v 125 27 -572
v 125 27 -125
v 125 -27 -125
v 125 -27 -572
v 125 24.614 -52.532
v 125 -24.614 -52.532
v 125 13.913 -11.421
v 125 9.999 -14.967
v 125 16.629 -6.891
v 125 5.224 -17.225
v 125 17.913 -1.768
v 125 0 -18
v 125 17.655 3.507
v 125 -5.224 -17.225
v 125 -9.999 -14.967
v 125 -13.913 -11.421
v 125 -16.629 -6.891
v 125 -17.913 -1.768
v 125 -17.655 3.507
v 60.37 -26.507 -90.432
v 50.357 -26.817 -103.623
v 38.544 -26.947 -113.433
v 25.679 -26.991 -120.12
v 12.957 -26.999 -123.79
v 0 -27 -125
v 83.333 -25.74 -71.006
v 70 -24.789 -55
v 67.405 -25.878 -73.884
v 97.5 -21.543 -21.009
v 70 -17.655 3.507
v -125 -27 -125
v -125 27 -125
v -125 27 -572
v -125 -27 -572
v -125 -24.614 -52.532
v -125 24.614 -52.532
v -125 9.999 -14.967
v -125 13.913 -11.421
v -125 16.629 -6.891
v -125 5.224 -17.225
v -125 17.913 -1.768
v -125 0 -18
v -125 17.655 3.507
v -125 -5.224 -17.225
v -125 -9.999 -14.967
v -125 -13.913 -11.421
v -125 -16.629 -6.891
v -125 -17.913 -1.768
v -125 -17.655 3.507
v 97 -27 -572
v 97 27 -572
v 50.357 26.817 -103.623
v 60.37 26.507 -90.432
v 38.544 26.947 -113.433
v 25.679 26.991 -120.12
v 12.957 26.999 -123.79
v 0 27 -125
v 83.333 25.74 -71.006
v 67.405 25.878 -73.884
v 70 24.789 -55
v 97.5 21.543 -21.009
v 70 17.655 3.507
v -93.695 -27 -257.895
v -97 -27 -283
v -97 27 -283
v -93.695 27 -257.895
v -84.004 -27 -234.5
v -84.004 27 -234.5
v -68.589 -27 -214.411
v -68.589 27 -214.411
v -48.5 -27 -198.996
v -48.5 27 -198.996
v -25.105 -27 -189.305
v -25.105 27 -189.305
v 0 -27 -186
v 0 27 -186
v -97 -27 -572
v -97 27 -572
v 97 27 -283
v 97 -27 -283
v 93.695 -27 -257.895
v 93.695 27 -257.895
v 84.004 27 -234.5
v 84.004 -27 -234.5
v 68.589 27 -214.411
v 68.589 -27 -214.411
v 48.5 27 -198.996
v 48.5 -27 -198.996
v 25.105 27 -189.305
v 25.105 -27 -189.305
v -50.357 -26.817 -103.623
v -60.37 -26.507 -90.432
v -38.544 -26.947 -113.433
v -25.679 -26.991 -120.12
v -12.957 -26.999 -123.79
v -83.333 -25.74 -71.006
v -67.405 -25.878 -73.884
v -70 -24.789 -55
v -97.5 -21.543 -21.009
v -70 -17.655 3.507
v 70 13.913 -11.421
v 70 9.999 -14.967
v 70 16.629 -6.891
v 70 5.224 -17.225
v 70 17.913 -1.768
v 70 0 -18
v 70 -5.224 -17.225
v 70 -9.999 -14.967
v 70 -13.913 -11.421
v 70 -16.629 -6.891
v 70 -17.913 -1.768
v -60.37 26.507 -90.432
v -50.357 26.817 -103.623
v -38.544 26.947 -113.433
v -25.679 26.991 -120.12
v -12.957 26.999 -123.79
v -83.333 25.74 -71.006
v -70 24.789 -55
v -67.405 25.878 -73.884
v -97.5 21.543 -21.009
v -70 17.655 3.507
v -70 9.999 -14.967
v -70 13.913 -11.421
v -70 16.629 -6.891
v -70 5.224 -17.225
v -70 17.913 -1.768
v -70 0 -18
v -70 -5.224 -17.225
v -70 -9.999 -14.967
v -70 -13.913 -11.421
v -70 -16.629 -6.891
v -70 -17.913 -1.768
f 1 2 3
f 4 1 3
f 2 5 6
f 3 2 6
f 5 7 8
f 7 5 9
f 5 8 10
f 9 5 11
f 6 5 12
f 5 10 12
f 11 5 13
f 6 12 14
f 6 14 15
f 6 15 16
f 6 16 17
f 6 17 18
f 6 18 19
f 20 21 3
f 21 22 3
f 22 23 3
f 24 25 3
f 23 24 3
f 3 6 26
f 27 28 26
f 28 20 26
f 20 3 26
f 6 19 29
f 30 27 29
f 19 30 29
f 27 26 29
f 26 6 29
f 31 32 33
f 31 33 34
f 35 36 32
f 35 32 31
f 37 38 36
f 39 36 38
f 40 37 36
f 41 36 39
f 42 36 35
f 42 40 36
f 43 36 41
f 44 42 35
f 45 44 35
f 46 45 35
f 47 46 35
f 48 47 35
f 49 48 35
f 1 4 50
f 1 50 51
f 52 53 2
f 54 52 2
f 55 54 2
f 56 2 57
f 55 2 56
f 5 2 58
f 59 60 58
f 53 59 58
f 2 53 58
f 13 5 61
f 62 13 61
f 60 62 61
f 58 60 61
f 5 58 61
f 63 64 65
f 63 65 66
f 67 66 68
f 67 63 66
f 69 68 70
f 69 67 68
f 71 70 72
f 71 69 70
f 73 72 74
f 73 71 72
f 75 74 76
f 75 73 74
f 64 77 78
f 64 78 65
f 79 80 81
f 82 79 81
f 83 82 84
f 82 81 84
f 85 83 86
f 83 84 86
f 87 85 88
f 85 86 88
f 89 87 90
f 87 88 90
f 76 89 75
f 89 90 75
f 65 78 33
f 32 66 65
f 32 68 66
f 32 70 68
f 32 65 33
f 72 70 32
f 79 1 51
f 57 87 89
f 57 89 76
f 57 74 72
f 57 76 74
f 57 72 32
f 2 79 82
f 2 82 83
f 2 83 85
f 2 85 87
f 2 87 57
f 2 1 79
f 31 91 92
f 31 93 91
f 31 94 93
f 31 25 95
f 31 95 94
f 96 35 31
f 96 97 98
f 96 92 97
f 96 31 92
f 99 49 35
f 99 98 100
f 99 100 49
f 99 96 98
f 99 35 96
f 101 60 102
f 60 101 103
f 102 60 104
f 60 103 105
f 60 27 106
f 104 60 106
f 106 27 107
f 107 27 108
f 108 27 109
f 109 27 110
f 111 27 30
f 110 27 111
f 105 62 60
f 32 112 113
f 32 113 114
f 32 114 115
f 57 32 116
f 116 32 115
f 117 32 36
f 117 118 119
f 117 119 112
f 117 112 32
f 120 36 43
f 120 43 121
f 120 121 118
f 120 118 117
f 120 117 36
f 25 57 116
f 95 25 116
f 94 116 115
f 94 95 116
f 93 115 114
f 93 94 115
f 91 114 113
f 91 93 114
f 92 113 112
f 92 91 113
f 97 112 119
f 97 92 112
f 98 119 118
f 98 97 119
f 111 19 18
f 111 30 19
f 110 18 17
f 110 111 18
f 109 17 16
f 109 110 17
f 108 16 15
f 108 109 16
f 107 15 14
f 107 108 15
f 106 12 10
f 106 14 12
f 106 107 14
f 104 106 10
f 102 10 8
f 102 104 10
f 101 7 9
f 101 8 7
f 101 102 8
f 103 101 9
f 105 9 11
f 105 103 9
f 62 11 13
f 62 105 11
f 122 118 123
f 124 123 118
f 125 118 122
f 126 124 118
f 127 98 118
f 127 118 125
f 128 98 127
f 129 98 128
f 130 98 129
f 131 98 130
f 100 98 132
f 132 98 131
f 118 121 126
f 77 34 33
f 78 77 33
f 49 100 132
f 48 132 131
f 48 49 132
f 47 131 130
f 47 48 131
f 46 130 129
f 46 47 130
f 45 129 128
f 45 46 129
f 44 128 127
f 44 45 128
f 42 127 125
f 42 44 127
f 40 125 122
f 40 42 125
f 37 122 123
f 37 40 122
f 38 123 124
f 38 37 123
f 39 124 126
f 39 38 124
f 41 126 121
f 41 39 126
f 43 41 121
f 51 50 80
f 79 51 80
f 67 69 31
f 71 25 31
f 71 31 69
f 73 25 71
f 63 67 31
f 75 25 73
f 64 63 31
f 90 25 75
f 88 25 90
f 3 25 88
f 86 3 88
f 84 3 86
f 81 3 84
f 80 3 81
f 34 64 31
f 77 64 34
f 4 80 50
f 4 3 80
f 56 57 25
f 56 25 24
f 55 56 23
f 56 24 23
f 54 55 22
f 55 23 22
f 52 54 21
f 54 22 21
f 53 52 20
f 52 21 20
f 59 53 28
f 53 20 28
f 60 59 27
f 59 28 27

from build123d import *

# Parameters (mm, degrees)
POWIERZCHNIA_PO_CZ2_START   = -125
POWIERZCHNIA_PO_CZ2_DEPTH   = 125
POWIERZCHNIA_PO_CZ2_START_2 = -27
POWIERZCHNIA_PO_CZ2_2_DEPTH = 54
SZKIC4_R                    = 18
WYTNIJ_WYCI_GNI_CIE1_DEPTH  = 625.830377118


with BuildPart() as part:
    # Powierzchnia-Połącz2: read off the stored shape, not the designer's step
    # Powierzchnia-Połącz2 outline → Powierzchnia-Połącz2 (new body)
    with BuildSketch(Plane.YZ.offset(POWIERZCHNIA_PO_CZ2_START)):
        with BuildLine():
            add(Edge.make_bspline(
                [(-27, -125), (-27, -65.312641889), (-22.885580179, -22.821723351), (-17.654979183, 3.50737937)],
                knots=[0, 0, 0, 0, 1, 1, 1, 1], degree=3))
            Line((-27, -125), (-27, -572))
            Line((-27, -572), (27, -572))
            Line((27, -572), (27, -125))
            add(Edge.make_bspline(
                [(17.654979183, 3.50737937), (22.885580179, -22.821723351), (27, -65.312641889), (27, -125)],
                knots=[0, 0, 0, 0, 1, 1, 1, 1], degree=3))
            ThreePointArc((17.654979183, 3.50737937), (0, 18), (-17.654979183, 3.50737937))
        make_face()
    extrude(amount=POWIERZCHNIA_PO_CZ2_DEPTH)

    # Powierzchnia-Po_cz2 2 outline → Powierzchnia-Po_cz2 2 (cut)
    with BuildSketch(Plane(origin=(0, 0, 0), x_dir=(1, 0, 0), z_dir=(0, 1, 0)).offset(POWIERZCHNIA_PO_CZ2_START_2)):
        with BuildLine():
            Line((-70, 55), (-70, -20))
            Line((-70, -20), (0, -20))
            Line((0, -20), (0, 125))
            ThreePointArc((0, 125), (-49.497474683, 104.497474683), (-70, 55))
        make_face()
        with BuildLine():
            ThreePointArc((-97, 283), (-68.589357775, 214.410642225), (0, 186))
            Line((0, 186), (0, 572))
            Line((0, 572), (-97, 572))
            Line((-97, 572), (-97, 283))
        make_face()
    extrude(amount=POWIERZCHNIA_PO_CZ2_2_DEPTH, mode=Mode.SUBTRACT)

    # Lustro1: part across plane


with BuildPart() as part_1:
    add(part.part)
    add(part.part.mirror(Plane(origin=(0, 0, 0), x_dir=(0, 0, 1), z_dir=(1, 0, 0))))

    # Szkic4 → Wytnij-wyciągnięcie1 (cut, through all)
    with BuildSketch(Plane(origin=(-125, 0, 0), x_dir=(0, 0, -1), z_dir=(1, 0, 0))):
        Circle(SZKIC4_R)
    extrude(amount=WYTNIJ_WYCI_GNI_CIE1_DEPTH, mode=Mode.SUBTRACT)


solid = part_1.part
